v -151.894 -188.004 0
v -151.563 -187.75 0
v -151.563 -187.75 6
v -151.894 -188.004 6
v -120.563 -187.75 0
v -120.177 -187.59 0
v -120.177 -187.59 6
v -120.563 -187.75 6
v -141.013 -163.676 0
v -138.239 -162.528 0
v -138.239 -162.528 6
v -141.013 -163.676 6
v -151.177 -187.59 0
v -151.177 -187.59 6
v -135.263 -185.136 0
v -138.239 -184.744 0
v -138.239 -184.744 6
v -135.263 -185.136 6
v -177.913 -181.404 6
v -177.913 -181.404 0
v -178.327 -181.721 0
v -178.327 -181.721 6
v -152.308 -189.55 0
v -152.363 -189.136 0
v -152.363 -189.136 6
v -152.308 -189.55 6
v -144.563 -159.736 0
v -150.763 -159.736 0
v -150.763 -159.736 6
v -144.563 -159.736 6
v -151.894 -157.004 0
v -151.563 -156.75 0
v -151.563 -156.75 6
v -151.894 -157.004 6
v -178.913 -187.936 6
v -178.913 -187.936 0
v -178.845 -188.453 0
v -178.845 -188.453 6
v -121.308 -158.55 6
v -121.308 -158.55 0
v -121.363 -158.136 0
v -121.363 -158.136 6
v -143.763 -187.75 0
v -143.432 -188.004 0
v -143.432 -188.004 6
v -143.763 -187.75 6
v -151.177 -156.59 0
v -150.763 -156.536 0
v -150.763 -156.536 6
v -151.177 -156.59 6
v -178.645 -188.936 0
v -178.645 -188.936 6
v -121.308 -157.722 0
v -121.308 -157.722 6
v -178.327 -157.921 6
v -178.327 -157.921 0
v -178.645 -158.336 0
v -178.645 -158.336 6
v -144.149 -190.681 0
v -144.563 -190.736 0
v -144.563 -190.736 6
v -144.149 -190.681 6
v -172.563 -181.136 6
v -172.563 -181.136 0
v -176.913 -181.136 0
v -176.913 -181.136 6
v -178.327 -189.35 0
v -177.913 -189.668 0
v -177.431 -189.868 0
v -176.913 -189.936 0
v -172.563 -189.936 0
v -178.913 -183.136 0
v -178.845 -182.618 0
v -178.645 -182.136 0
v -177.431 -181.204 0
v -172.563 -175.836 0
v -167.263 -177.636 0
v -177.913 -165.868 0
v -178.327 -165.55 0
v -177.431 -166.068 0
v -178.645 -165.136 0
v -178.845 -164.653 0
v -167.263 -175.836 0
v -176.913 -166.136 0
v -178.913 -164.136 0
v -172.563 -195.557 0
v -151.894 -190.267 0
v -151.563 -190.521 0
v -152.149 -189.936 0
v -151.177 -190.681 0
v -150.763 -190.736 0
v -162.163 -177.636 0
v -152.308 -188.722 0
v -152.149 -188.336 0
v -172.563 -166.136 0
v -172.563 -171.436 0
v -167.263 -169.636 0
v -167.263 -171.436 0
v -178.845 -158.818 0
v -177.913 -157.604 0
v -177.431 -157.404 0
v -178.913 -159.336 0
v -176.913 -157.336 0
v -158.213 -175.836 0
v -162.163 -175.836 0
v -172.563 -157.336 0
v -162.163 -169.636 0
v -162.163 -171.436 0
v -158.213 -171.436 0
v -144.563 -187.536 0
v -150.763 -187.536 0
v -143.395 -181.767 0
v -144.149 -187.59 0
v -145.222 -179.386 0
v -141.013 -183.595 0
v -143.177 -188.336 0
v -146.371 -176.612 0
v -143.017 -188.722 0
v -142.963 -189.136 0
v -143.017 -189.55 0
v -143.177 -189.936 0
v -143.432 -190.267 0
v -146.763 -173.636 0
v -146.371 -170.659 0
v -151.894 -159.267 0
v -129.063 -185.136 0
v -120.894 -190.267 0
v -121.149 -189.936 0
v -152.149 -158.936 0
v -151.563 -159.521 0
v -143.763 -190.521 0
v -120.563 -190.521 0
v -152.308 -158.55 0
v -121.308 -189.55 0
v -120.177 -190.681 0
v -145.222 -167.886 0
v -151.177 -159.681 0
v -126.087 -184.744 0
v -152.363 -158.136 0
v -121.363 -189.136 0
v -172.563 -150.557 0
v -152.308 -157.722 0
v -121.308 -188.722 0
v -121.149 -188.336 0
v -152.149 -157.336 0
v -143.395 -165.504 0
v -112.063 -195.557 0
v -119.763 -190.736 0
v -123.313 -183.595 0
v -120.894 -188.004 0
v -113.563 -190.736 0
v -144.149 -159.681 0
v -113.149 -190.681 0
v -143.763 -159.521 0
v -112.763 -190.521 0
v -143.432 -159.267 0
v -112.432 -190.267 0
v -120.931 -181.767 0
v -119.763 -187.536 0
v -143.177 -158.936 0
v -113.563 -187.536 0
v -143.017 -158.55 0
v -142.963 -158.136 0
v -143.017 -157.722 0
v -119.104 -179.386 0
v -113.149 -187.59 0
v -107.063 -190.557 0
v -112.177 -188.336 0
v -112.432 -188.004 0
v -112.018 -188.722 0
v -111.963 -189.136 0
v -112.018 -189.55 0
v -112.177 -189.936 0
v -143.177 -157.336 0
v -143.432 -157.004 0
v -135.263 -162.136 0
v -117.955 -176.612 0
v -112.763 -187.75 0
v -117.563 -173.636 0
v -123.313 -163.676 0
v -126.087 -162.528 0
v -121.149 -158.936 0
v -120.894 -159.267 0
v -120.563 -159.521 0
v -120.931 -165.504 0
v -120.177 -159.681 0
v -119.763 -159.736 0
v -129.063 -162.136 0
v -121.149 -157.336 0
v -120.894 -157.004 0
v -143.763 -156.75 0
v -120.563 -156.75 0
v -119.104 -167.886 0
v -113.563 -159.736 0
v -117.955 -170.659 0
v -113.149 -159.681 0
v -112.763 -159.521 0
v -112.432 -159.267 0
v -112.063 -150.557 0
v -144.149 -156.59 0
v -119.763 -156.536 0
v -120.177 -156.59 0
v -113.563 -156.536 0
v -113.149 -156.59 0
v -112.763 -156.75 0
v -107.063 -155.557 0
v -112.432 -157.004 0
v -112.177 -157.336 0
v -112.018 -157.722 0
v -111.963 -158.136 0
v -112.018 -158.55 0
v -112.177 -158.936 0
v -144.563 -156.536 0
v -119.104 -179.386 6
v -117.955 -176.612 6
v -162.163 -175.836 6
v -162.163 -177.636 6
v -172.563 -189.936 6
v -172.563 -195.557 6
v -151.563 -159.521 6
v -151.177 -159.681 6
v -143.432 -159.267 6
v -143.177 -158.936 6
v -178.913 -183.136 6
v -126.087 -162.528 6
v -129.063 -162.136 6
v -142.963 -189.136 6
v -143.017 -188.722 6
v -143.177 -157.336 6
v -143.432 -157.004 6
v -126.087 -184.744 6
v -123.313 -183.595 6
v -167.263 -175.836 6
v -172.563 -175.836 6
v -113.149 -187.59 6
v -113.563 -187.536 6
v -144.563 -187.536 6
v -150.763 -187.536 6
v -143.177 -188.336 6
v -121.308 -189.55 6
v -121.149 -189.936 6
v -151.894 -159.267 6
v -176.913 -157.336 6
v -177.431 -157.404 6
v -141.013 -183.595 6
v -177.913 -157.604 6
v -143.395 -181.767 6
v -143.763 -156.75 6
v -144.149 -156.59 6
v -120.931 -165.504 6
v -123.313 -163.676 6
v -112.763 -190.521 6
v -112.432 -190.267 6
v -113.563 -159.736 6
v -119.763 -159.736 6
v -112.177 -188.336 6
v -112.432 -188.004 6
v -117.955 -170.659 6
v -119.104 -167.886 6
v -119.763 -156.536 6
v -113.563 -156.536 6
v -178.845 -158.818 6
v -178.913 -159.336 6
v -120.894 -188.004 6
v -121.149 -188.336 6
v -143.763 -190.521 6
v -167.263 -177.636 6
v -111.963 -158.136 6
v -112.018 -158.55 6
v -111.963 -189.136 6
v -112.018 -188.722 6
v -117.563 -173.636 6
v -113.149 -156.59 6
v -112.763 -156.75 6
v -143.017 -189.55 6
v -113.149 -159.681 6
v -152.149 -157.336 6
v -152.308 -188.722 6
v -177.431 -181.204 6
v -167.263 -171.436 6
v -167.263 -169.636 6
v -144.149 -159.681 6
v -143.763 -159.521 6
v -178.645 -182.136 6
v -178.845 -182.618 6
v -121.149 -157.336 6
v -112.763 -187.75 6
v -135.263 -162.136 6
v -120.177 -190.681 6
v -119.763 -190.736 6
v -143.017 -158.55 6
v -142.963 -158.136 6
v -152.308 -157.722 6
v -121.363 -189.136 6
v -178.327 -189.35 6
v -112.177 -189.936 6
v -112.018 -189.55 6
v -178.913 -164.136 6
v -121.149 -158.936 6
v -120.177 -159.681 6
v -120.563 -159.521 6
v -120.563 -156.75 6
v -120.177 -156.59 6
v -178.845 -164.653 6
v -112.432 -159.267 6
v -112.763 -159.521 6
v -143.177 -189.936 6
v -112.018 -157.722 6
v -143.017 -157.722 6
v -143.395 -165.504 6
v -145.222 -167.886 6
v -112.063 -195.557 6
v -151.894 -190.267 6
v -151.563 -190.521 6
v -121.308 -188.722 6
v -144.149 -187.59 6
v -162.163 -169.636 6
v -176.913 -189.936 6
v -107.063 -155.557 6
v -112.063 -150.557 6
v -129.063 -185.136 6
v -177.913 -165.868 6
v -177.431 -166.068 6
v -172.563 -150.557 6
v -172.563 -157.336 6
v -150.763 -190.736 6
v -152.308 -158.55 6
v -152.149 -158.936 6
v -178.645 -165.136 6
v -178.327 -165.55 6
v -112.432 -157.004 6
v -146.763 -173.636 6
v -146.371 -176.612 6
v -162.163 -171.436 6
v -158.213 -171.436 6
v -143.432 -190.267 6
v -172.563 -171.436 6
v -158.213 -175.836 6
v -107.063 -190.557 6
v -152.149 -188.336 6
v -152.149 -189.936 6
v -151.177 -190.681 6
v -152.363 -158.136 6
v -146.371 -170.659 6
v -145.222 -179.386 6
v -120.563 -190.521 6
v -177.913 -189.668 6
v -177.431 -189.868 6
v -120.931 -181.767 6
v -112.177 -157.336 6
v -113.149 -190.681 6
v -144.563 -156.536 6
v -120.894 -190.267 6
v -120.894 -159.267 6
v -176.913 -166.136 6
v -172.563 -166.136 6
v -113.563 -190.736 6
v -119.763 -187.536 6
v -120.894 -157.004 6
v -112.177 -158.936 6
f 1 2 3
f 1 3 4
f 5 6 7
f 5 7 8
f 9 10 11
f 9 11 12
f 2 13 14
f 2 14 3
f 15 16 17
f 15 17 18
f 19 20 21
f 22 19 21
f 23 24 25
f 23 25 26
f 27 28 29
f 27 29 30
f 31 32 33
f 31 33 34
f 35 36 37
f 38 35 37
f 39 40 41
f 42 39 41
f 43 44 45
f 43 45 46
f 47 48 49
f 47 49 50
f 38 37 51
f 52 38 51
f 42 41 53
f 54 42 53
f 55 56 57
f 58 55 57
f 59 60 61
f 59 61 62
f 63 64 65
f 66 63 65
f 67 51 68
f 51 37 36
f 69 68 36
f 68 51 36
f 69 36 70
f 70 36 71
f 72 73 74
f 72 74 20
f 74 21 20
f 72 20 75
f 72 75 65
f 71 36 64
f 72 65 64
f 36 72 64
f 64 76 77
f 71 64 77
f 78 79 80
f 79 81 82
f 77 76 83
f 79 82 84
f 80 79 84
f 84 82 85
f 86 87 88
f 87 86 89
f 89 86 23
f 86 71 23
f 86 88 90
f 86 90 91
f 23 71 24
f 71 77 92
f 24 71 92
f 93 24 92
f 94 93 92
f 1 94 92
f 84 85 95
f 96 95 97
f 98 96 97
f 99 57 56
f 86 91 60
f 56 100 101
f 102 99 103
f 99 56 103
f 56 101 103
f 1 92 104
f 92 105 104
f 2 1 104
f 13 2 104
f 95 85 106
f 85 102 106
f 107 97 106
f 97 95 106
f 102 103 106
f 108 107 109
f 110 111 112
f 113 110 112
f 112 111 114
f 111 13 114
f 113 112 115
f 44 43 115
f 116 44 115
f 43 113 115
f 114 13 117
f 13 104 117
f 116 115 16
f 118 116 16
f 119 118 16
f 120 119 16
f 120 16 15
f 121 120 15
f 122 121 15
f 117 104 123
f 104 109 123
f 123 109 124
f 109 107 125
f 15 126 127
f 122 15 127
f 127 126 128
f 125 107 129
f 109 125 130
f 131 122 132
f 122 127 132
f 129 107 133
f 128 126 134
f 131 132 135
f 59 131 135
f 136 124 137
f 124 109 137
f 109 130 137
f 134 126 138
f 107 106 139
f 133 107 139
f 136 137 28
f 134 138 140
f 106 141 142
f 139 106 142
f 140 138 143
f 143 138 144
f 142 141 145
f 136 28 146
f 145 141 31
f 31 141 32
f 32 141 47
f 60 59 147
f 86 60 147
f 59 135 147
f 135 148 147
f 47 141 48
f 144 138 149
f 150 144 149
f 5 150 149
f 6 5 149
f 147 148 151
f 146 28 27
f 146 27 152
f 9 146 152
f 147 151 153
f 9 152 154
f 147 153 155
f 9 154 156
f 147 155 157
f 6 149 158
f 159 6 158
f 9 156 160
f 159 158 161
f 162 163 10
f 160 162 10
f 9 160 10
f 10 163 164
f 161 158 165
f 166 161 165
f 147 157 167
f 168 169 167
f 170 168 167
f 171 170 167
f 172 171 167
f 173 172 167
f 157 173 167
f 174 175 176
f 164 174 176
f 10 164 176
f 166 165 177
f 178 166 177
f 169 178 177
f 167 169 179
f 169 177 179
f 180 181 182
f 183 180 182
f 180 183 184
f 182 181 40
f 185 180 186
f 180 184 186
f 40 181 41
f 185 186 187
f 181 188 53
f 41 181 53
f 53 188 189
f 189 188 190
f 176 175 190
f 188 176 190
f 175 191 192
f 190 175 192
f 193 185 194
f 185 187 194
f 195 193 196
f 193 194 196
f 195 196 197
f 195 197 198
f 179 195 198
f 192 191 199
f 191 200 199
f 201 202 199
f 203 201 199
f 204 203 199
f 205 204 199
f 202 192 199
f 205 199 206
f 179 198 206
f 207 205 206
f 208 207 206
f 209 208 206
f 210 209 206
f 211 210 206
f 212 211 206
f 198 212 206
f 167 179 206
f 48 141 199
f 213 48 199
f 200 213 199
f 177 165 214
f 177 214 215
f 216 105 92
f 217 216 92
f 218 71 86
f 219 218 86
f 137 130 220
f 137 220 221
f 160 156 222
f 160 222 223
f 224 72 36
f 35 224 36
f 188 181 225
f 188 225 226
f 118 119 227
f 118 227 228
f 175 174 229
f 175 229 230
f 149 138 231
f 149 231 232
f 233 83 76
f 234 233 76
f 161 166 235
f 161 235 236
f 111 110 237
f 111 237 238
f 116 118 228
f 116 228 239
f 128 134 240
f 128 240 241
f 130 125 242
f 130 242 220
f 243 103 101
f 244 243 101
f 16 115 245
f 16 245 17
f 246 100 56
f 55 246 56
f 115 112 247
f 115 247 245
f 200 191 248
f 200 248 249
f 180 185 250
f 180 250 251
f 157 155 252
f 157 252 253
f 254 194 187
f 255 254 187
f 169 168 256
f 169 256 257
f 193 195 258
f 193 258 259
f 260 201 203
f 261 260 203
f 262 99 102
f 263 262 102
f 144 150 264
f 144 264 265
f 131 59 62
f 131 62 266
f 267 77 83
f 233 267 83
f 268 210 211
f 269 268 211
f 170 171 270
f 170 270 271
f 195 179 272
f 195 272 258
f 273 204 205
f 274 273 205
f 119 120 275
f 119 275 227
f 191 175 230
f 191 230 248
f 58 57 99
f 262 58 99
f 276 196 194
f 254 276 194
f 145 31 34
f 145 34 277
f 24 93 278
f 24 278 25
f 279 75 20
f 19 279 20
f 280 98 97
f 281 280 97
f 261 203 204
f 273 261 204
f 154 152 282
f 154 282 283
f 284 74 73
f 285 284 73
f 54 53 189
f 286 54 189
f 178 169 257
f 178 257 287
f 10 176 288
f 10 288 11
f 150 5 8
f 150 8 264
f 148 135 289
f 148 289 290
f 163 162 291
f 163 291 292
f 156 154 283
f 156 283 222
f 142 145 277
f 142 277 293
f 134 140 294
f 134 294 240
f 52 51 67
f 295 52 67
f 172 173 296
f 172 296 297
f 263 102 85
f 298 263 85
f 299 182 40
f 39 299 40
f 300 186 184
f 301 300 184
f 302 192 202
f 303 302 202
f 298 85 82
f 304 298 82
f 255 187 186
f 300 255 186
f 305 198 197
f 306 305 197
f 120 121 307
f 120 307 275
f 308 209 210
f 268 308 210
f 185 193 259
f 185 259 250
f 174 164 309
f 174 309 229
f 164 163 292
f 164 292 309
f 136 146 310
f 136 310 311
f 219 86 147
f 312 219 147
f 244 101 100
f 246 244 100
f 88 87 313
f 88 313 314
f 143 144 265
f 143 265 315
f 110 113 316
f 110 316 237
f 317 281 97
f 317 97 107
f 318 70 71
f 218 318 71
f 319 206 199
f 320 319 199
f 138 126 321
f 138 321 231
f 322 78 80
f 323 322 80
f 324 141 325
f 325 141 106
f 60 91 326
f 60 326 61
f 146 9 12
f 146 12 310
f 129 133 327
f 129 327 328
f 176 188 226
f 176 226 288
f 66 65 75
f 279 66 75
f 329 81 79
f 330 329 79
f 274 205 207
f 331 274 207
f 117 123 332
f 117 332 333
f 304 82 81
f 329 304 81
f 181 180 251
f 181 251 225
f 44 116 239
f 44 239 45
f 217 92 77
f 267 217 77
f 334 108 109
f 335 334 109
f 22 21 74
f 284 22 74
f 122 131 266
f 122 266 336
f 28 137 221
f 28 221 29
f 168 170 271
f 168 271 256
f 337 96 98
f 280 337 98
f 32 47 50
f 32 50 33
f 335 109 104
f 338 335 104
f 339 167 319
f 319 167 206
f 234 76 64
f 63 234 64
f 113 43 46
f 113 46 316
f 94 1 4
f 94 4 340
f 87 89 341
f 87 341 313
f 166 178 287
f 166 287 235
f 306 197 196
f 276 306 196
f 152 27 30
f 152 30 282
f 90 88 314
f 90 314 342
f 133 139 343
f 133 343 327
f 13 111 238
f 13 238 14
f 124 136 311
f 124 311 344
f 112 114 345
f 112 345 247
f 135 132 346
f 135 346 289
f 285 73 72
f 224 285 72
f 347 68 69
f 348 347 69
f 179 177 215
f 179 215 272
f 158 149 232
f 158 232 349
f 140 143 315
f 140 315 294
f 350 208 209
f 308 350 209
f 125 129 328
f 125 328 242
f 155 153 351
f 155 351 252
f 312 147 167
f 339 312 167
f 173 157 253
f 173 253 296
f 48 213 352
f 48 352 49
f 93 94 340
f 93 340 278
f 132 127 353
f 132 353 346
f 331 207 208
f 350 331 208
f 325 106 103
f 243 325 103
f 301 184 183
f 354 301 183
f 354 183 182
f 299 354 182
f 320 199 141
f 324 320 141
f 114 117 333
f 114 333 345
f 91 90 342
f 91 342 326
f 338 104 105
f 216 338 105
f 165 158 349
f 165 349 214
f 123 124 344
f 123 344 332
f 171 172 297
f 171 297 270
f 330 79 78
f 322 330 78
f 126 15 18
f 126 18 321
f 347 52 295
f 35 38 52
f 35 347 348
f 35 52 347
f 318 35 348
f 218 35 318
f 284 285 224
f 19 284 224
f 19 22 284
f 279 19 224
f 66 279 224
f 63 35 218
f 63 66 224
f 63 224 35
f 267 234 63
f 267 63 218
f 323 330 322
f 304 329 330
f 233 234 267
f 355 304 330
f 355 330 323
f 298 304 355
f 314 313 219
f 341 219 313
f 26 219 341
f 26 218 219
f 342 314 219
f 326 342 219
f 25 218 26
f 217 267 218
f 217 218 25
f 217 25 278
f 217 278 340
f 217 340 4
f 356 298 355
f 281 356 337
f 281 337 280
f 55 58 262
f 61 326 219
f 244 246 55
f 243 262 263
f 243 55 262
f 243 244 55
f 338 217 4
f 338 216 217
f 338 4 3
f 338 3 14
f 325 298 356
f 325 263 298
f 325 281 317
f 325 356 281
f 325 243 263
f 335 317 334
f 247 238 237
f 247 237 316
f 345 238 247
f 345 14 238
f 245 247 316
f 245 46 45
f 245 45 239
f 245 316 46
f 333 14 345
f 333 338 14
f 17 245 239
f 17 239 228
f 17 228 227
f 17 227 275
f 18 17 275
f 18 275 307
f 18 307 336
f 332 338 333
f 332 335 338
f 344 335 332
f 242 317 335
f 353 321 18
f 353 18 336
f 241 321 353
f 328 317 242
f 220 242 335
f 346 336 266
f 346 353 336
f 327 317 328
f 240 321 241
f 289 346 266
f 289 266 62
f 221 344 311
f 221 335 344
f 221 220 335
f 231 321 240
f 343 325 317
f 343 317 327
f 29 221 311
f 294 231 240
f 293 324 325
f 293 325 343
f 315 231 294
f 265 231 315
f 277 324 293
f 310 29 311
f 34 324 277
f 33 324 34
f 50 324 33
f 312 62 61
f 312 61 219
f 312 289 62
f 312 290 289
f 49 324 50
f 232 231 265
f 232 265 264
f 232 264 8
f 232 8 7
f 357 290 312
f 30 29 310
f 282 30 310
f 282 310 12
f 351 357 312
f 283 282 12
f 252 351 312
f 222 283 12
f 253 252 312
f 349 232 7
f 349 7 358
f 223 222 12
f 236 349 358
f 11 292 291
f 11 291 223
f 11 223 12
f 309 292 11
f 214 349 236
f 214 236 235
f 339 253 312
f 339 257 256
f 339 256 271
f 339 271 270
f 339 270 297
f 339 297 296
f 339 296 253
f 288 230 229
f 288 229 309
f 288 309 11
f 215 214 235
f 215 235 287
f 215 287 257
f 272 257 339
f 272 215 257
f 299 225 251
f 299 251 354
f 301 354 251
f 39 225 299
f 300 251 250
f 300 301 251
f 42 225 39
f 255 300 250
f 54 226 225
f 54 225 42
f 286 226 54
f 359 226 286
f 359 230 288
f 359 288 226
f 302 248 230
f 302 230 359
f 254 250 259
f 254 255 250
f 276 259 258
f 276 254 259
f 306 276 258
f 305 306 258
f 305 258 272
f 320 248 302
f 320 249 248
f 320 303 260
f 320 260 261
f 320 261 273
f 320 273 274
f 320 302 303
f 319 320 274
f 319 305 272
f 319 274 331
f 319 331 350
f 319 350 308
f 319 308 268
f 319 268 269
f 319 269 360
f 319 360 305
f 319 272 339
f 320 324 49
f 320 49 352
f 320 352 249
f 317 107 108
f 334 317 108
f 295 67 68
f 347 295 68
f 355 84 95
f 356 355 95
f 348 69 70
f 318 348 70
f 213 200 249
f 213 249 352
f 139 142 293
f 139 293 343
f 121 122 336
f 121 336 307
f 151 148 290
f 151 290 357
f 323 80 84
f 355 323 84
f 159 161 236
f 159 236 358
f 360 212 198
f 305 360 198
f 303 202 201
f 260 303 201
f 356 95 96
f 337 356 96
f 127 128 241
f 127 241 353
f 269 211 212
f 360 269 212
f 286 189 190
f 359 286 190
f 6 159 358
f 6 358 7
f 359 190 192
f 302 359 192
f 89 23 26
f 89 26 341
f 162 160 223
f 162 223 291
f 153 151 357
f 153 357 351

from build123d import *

# Parameters (mm, degrees)
BOSS_EXTRUDE1_DEPTH = 6


with BuildPart() as part:
    # Sketch1 → Boss-Extrude1 (new body)
    with BuildSketch(Plane.XY):
        Polygon((-107.062987014, -155.556624264), (-112.062985414, -150.556625864), (-172.562973402, -150.556625864), (-172.562973402, -157.335700029), (-176.912971293, -157.335700029), (-177.430609383, -157.403848376), (-177.912971293, -157.603649221), (-178.327184855, -157.921486467), (-178.6450221, -158.335700029), (-178.844822945, -158.818061939), (-178.912971293, -159.335700029), (-178.912971293, -164.135695994), (-178.844822945, -164.653334084), (-178.6450221, -165.135695994), (-178.327184855, -165.549909556), (-177.912971293, -165.867746802), (-177.430609383, -166.067547647), (-176.912971293, -166.135695994), (-172.562973402, -166.135695994), (-172.562973402, -171.435688001), (-167.26297458, -171.435688001), (-167.26297458, -169.635689769), (-162.162976815, -169.635689769), (-162.162976815, -171.435688001), (-158.212977143, -171.435688001), (-158.212977143, -175.835692673), (-162.162976966, -175.835692673), (-162.162976966, -177.635690904), (-167.26297473, -177.635690904), (-167.26297473, -175.835692673), (-172.562973552, -175.835692673), (-172.562973552, -181.135689927), (-176.912971443, -181.135689927), (-177.430609533, -181.203838275), (-177.912971443, -181.40363912), (-178.327185006, -181.721476365), (-178.645022251, -182.135689927), (-178.844823096, -182.618051837), (-178.912971443, -183.135689927), (-178.912971443, -187.93568437), (-178.844823096, -188.45332246), (-178.645022251, -188.93568437), (-178.327185006, -189.349897932), (-177.912971443, -189.667735177), (-177.430609533, -189.867536022), (-176.912971443, -189.93568437), (-172.562973552, -189.93568437), (-172.562973552, -195.556608264), (-112.062985371, -195.556608264), (-107.062987014, -190.556608264), align=None)
        Polygon((-150.762975594, -156.535695809), (-151.177085934, -156.590214469), (-151.562975338, -156.750055094), (-151.894346082, -157.004324809), (-152.148615797, -157.335695553), (-152.308456422, -157.721584957), (-152.362975082, -158.135695297), (-152.308456422, -158.549805636), (-152.148615797, -158.935695041), (-151.894346082, -159.267065785), (-151.562975338, -159.521335499), (-151.177085934, -159.681176124), (-150.762975594, -159.735694785), (-144.562976618, -159.735694785), (-144.148866278, -159.681176124), (-143.762976874, -159.521335499), (-143.43160613, -159.267065785), (-143.177336415, -158.935695041), (-143.017495791, -158.549805636), (-142.96297713, -158.135695297), (-143.017495791, -157.721584957), (-143.177336415, -157.335695553), (-143.43160613, -157.004324809), (-143.762976874, -156.750055094), (-144.148866278, -156.590214469), (-144.562976618, -156.535695809), align=None, mode=Mode.SUBTRACT)
        Polygon((-143.431606507, -188.004315269), (-143.762977251, -187.750045554), (-144.148866655, -187.590204929), (-144.562976995, -187.535686269), (-150.762975971, -187.535686269), (-151.17708631, -187.590204929), (-151.562975715, -187.750045554), (-151.894346459, -188.004315269), (-152.148616173, -188.335686013), (-152.308456798, -188.721575417), (-152.362975459, -189.135685757), (-152.308456798, -189.549796096), (-152.148616173, -189.935685501), (-151.894346459, -190.267056245), (-151.562975715, -190.521325959), (-151.17708631, -190.681166584), (-150.762975971, -190.735685245), (-144.562976995, -190.735685245), (-144.148866655, -190.681166584), (-143.762977251, -190.521325959), (-143.431606507, -190.267056245), (-143.177336792, -189.935685501), (-143.017496167, -189.549796096), (-142.962977507, -189.135685757), (-143.017496167, -188.721575417), (-143.177336792, -188.335686013), align=None, mode=Mode.SUBTRACT)
        Polygon((-121.362985002, -189.135685377), (-121.308466342, -189.549795716), (-121.148625717, -189.935685121), (-120.894356002, -190.267055865), (-120.562985258, -190.521325579), (-120.177095854, -190.681166204), (-119.762985514, -190.735684865), (-113.562986538, -190.735684865), (-113.148876198, -190.681166204), (-112.762986794, -190.521325579), (-112.43161605, -190.267055865), (-112.177346335, -189.935685121), (-112.017505711, -189.549795716), (-111.96298705, -189.135685377), (-112.017505711, -188.721575037), (-112.177346335, -188.335685633), (-112.43161605, -188.004314889), (-112.762986794, -187.750045174), (-113.148876198, -187.590204549), (-113.562986538, -187.535685889), (-119.762985514, -187.535685889), (-120.177095854, -187.590204549), (-120.562985258, -187.750045174), (-120.894356002, -188.004314889), (-121.148625717, -188.335685633), (-121.308466342, -188.721575037), align=None, mode=Mode.SUBTRACT)
        Polygon((-119.762985514, -156.535695809), (-113.562986538, -156.535695809), (-113.148876198, -156.590214469), (-112.762986794, -156.750055094), (-112.43161605, -157.004324809), (-112.177346335, -157.335695553), (-112.017505711, -157.721584957), (-111.96298705, -158.135695297), (-112.017505711, -158.549805636), (-112.177346335, -158.935695041), (-112.43161605, -159.267065785), (-112.762986794, -159.521335499), (-113.148876198, -159.681176124), (-113.562986538, -159.735694785), (-119.762985514, -159.735694785), (-120.177095854, -159.681176124), (-120.562985258, -159.521335499), (-120.894356002, -159.267065785), (-121.148625717, -158.935695041), (-121.308466342, -158.549805636), (-121.362985002, -158.135695297), (-121.308466342, -157.721584957), (-121.148625717, -157.335695553), (-120.894356002, -157.004324809), (-120.562985258, -156.750055094), (-120.177095854, -156.590214469), align=None, mode=Mode.SUBTRACT)
        Polygon((-126.086563512, -184.743833784), (-123.312983418, -183.594979293), (-120.931256197, -181.767415718), (-119.103692622, -179.385688497), (-117.95483813, -176.612108403), (-117.562985258, -173.635690337), (-117.95483813, -170.65927227), (-119.103692622, -167.885692177), (-120.931256197, -165.503964955), (-123.312983418, -163.67640138), (-126.086563512, -162.527546889), (-129.062981578, -162.135694017), (-135.262980554, -162.135694017), (-138.23939862, -162.527546889), (-141.012978714, -163.67640138), (-143.394705936, -165.503964955), (-145.222269511, -167.885692177), (-146.371124002, -170.65927227), (-146.762976874, -173.635690337), (-146.371124002, -176.612108403), (-145.222269511, -179.385688497), (-143.394705936, -181.767415718), (-141.012978714, -183.594979293), (-138.23939862, -184.743833784), (-135.262980554, -185.135686657), (-129.062981578, -185.135686657), align=None, mode=Mode.SUBTRACT)
    extrude(amount=BOSS_EXTRUDE1_DEPTH)


solid = part.part
